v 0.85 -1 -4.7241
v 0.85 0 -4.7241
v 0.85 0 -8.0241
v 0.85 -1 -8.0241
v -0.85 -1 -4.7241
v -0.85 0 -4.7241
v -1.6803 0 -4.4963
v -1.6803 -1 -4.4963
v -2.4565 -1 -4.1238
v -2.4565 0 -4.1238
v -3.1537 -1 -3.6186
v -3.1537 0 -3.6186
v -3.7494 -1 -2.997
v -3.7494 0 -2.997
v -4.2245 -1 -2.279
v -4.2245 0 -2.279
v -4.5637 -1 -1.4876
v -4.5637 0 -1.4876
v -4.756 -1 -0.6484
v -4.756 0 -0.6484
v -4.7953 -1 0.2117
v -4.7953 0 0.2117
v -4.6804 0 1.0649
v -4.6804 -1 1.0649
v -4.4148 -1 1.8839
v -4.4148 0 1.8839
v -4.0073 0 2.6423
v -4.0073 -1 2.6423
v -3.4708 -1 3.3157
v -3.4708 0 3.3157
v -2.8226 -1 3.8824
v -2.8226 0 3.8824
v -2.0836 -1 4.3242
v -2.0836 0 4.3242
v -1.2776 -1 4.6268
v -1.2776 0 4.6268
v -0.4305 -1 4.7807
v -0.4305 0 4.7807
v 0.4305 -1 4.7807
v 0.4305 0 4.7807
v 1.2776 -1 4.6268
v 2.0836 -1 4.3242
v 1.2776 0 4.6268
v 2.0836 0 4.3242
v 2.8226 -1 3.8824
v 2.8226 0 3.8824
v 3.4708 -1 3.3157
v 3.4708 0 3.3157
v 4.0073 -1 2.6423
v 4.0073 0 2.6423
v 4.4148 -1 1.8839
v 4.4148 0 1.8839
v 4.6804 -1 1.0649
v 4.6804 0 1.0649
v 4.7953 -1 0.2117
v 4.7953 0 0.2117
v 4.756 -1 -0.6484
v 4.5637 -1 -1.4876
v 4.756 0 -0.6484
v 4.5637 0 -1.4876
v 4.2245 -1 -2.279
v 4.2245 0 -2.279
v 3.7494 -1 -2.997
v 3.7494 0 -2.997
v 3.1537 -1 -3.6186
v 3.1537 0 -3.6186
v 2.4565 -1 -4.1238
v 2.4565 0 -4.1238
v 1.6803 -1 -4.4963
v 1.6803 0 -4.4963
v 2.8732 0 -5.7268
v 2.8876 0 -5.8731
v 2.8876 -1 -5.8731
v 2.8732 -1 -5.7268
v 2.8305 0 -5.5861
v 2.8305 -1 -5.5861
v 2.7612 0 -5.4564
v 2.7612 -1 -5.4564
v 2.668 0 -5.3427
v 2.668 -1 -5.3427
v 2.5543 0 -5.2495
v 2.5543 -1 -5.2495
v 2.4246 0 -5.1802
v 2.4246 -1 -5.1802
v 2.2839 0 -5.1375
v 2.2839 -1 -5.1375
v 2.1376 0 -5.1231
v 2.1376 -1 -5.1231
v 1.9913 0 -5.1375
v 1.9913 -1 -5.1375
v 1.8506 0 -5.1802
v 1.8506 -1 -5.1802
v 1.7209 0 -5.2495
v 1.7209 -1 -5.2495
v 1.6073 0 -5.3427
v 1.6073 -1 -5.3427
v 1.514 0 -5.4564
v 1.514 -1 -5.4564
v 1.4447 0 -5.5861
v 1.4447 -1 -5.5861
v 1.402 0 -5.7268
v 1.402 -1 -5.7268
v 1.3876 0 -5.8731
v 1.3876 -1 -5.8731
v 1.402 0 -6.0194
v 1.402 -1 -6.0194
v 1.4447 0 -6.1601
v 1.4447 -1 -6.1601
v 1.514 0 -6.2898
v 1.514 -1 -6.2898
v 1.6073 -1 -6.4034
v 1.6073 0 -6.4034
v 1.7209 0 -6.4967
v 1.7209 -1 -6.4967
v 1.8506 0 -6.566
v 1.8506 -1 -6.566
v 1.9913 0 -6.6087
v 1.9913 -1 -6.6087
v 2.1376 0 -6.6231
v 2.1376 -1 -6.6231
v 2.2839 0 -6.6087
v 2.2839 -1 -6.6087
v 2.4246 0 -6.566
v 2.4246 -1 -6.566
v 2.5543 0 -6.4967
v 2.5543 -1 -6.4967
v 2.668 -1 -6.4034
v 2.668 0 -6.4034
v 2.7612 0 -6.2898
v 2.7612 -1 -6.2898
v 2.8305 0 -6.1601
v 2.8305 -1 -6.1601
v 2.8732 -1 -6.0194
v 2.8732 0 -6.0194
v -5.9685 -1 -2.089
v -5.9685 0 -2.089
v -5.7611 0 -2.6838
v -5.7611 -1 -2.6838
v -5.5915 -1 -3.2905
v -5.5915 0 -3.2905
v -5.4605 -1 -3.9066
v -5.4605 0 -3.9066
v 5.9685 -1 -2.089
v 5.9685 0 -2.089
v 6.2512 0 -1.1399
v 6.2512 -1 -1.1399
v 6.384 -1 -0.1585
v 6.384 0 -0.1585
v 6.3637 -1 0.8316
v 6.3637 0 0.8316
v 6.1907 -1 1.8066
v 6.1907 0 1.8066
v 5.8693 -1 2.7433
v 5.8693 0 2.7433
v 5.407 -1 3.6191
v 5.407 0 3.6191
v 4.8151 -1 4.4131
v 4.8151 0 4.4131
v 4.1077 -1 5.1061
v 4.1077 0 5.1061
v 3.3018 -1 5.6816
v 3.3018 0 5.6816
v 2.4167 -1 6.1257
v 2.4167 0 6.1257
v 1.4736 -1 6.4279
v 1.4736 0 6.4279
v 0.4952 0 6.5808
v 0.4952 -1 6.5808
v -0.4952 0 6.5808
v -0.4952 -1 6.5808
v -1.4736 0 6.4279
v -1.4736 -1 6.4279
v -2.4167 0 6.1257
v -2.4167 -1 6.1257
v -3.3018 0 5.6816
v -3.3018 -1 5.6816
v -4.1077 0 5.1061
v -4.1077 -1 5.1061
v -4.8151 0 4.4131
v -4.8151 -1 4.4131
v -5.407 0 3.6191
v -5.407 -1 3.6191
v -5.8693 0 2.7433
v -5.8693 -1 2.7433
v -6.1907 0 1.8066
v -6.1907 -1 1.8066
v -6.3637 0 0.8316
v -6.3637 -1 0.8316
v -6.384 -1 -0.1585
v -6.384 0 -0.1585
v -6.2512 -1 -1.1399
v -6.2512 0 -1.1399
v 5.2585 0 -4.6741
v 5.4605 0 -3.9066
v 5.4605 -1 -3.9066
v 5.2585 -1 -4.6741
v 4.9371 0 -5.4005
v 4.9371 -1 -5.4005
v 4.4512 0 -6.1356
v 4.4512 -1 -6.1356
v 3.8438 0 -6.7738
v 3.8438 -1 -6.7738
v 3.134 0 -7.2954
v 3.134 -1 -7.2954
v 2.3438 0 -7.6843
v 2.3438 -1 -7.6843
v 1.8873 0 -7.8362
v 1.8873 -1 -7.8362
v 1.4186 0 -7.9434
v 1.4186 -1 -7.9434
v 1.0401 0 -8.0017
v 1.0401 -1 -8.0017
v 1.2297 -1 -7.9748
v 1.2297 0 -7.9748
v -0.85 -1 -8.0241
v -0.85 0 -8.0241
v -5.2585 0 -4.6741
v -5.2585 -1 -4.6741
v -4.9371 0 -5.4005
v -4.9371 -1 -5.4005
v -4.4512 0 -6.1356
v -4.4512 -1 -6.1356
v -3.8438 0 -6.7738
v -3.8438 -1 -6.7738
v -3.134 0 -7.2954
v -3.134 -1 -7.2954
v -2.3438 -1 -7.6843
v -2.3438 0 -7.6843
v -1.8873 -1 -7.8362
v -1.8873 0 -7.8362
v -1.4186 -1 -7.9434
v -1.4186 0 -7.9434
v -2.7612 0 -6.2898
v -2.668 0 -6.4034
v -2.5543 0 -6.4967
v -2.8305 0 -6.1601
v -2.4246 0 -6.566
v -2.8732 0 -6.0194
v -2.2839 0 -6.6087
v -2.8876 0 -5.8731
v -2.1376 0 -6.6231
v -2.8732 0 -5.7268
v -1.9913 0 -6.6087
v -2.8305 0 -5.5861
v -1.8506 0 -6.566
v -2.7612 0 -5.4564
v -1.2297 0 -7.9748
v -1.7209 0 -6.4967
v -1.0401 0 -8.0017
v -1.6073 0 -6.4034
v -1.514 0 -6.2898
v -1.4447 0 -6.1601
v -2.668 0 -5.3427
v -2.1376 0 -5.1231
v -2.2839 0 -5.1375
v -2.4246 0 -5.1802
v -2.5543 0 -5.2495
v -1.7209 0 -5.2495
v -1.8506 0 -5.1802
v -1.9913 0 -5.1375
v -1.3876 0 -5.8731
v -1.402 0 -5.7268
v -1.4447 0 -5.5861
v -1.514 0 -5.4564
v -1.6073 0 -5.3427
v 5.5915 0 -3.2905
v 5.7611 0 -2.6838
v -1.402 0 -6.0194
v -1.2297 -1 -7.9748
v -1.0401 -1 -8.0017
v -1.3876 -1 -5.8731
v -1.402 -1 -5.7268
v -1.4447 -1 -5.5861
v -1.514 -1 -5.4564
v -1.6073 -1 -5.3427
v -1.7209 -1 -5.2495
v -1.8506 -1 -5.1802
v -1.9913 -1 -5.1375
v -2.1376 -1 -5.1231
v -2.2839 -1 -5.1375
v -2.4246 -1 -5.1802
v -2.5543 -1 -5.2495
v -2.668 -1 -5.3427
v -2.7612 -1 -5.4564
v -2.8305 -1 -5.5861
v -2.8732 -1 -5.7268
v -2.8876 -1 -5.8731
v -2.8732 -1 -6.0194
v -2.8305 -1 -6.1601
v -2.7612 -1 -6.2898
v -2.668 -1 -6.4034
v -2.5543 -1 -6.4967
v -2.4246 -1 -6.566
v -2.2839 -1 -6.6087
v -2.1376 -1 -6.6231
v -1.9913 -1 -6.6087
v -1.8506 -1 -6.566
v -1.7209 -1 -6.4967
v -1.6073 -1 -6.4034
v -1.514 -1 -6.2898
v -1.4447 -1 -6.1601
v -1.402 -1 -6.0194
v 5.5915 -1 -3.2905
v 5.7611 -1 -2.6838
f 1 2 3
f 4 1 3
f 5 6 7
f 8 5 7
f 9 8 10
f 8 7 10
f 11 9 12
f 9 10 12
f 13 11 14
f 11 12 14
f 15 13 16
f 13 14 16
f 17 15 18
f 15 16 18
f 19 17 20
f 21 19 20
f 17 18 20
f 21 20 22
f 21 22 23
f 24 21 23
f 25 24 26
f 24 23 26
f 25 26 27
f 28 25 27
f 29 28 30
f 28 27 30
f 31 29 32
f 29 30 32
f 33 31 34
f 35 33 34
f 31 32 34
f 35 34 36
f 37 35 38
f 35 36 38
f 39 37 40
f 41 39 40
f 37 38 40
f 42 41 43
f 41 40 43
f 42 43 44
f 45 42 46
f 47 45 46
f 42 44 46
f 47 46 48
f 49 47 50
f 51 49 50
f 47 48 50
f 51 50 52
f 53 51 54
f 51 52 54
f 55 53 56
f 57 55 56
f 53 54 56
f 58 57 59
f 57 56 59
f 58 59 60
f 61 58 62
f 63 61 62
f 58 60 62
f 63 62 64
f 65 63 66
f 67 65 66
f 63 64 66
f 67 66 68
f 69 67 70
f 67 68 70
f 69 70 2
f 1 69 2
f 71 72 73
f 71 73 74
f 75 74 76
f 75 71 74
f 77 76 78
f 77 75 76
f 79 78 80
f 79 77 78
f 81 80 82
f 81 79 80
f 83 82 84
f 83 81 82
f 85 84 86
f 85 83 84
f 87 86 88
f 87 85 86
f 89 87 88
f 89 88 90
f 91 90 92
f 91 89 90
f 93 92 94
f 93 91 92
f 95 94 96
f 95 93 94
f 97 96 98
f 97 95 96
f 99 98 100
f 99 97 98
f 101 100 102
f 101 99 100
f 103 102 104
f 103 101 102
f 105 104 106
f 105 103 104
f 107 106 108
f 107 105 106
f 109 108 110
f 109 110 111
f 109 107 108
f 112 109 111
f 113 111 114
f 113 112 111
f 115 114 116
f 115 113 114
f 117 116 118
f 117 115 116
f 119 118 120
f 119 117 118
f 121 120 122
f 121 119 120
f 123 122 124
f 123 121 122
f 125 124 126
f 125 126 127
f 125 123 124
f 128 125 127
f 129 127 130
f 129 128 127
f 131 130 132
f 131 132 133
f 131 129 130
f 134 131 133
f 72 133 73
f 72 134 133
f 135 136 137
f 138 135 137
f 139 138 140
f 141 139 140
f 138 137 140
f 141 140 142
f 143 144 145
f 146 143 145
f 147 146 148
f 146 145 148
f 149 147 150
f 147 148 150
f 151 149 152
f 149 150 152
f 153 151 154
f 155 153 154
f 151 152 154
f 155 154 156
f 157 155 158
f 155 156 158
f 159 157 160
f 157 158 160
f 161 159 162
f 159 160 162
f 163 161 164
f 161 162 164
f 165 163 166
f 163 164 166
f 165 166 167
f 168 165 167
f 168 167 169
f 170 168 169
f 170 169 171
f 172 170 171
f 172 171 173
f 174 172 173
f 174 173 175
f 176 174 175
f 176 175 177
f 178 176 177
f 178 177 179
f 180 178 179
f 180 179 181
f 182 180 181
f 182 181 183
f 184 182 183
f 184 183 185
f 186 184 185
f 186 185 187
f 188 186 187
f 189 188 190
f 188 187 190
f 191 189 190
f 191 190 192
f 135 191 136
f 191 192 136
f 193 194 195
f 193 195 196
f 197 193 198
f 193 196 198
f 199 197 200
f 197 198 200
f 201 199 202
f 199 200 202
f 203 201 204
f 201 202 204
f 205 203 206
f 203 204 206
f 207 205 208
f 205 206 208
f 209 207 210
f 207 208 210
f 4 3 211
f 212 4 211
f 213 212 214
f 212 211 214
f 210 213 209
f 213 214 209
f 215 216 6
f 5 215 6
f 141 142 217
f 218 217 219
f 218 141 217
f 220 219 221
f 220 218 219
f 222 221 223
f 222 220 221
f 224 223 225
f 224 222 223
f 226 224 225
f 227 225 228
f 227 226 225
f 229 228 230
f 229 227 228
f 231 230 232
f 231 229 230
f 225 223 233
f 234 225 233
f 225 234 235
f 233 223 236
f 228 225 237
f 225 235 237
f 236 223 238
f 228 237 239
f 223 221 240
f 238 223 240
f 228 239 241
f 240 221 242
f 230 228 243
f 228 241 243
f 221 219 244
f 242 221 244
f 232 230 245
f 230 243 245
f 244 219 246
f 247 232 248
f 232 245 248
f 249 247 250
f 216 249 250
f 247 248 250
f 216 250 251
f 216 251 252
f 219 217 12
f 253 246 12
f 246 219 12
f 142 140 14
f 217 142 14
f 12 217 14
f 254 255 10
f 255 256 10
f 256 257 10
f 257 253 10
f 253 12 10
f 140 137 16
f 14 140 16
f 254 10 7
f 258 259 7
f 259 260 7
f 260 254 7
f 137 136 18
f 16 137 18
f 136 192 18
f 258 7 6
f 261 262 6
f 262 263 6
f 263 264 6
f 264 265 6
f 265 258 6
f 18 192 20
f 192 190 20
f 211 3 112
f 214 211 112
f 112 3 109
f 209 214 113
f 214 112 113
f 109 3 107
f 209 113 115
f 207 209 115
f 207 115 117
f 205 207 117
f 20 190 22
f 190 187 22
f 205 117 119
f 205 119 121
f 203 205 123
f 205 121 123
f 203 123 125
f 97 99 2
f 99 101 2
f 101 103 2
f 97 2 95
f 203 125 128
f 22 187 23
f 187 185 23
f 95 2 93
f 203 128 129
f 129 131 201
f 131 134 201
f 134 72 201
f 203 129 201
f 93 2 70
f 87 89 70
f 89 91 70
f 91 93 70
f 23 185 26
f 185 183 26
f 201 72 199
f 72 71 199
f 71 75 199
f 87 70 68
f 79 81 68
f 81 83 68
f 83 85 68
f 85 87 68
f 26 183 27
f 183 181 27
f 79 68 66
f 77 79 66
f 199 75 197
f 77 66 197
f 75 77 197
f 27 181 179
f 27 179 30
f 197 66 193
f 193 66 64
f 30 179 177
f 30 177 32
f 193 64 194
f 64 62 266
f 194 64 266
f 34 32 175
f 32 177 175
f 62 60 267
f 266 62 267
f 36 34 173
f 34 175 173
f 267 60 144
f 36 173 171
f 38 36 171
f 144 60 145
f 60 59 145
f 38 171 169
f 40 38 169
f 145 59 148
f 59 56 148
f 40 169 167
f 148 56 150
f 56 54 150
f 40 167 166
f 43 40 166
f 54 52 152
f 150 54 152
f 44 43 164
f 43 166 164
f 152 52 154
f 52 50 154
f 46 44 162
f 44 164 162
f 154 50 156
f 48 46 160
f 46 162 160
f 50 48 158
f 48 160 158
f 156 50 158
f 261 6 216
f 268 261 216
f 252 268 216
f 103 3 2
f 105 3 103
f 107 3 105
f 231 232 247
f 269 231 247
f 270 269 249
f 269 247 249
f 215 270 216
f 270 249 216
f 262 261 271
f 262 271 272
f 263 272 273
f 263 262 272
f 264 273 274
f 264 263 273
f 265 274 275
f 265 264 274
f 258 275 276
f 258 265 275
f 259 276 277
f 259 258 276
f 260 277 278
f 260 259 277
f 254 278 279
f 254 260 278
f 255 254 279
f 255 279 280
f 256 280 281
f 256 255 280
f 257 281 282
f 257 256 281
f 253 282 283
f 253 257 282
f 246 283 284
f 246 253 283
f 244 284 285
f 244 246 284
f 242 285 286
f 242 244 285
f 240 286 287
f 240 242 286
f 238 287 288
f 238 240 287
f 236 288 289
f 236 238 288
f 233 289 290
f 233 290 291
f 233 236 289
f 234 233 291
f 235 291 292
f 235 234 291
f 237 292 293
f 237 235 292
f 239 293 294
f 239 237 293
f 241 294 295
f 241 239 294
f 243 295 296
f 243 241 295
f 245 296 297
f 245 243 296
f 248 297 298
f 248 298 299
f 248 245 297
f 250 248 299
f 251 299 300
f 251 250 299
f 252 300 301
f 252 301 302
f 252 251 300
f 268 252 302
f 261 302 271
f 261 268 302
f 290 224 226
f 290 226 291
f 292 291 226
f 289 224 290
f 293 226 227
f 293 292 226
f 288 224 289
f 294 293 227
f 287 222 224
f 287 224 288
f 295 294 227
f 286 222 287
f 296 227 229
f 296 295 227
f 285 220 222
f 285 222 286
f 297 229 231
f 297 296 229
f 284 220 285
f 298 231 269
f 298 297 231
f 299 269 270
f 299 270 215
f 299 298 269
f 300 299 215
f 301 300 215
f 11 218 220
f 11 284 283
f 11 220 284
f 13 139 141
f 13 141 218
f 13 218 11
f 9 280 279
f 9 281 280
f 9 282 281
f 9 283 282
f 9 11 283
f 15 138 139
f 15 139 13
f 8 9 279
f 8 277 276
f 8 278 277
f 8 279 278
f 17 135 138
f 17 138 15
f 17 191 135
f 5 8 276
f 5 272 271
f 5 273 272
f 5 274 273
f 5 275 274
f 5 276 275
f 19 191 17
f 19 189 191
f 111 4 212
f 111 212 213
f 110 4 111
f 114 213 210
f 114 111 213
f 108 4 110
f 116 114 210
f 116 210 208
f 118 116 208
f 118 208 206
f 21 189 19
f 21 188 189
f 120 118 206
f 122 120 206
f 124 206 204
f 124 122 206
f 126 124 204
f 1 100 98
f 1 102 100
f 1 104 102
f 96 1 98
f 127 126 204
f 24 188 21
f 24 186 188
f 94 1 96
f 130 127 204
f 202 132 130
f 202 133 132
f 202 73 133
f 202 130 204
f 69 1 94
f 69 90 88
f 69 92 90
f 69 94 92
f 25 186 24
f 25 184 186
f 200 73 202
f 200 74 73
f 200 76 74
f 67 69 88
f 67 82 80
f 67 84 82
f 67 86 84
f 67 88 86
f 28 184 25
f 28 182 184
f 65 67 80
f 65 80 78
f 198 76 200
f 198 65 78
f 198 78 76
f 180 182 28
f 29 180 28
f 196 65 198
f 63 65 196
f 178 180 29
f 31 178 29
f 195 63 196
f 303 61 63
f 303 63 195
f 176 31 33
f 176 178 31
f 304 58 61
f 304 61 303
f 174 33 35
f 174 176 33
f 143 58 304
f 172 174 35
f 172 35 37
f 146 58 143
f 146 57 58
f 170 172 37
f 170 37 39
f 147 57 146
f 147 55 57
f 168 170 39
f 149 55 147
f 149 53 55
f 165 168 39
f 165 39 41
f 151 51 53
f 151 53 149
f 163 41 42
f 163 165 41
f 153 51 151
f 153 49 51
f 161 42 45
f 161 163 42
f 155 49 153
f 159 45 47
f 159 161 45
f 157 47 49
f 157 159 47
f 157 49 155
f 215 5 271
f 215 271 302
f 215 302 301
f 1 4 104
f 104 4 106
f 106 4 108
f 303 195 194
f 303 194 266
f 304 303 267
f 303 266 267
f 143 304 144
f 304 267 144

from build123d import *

# Parameters (mm, degrees)
F0_R        = 0.75
F1_DEPTH    = 1
F2_T1_DEPTH = 1
F3_R        = 5


# Not quite as in the source:
# - a fillet or chamfer that OpenCascade refuses, or shapes differently, is made with other operations: its cross-section is extruded or revolved along the edge and cut away or added


with BuildPart() as f1:
    # F0 (on Front) → F1 (new body)
    with BuildSketch(Plane.XZ):
        with BuildLine():
            ThreePointArc((-0.85, -4.7241401334), (0, 4.8), (0.85, -4.7241401334))
            Line((0.85, -4.7241401334), (0.85, -8.0241401334))
            ThreePointArc((0.85, -8.0241401334), (3.2306637909, -7.3940608836), (5.3104097906, -6.0752672975))
            Line((5.3104097906, -6.0752672975), (4.5, -4.3373378932))
            ThreePointArc((4.5, -4.3373378932), (0, 6.6), (-4.5, -4.3373378932))
            Line((-4.5, -4.3373378932), (-5.3104097906, -6.0752672975))
            ThreePointArc((-5.3104097906, -6.0752672975), (-3.2306637909, -7.3940608836), (-0.85, -8.0241401334))
            Line((-0.85, -8.0241401334), (-0.85, -4.7241401334))
        make_face()
        with Locations((-2.1376258958, -5.8730788799)):
            Circle(F0_R, mode=Mode.SUBTRACT)
        with Locations((2.1376258958, -5.8730788799)):
            Circle(F0_R, mode=Mode.SUBTRACT)
    extrude(amount=F1_DEPTH)

    # F2: fillet of radius 10 on 2 edges, made by hand

    # F2_s2 → F2_t1 (join)
    with BuildSketch(Plane.XZ):
        with BuildLine():
            ThreePointArc((-5.9685154732, -2.0889852458), (-5.4360464656, -4.0485437672), (-5.3104097906, -6.0752672975))
            Line((-5.3104097906, -6.0752672975), (-4.5, -4.3373378932))
            ThreePointArc((-4.5, -4.3373378932), (-5.3536180719, -3.2911219818), (-5.9685154732, -2.0889852458))
        make_face()
        with BuildLine():
            ThreePointArc((5.3104097906, -6.0752672975), (5.4360464656, -4.0485437672), (5.9685154732, -2.0889852458))
            ThreePointArc((5.9685154732, -2.0889852458), (5.3536180719, -3.2911219818), (4.5, -4.3373378932))
            Line((4.5, -4.3373378932), (5.3104097906, -6.0752672975))
        make_face()
    extrude(amount=F2_T1_DEPTH)

    # F3
    f3_edges = [f1.edges().sort_by_distance(p)[0] for p in [
        (-5.31041, -0.5, -6.075267),
        (5.31041, -0.5, -6.075267),
    ]]
    fillet(f3_edges, radius=F3_R)


solid = f1.part
